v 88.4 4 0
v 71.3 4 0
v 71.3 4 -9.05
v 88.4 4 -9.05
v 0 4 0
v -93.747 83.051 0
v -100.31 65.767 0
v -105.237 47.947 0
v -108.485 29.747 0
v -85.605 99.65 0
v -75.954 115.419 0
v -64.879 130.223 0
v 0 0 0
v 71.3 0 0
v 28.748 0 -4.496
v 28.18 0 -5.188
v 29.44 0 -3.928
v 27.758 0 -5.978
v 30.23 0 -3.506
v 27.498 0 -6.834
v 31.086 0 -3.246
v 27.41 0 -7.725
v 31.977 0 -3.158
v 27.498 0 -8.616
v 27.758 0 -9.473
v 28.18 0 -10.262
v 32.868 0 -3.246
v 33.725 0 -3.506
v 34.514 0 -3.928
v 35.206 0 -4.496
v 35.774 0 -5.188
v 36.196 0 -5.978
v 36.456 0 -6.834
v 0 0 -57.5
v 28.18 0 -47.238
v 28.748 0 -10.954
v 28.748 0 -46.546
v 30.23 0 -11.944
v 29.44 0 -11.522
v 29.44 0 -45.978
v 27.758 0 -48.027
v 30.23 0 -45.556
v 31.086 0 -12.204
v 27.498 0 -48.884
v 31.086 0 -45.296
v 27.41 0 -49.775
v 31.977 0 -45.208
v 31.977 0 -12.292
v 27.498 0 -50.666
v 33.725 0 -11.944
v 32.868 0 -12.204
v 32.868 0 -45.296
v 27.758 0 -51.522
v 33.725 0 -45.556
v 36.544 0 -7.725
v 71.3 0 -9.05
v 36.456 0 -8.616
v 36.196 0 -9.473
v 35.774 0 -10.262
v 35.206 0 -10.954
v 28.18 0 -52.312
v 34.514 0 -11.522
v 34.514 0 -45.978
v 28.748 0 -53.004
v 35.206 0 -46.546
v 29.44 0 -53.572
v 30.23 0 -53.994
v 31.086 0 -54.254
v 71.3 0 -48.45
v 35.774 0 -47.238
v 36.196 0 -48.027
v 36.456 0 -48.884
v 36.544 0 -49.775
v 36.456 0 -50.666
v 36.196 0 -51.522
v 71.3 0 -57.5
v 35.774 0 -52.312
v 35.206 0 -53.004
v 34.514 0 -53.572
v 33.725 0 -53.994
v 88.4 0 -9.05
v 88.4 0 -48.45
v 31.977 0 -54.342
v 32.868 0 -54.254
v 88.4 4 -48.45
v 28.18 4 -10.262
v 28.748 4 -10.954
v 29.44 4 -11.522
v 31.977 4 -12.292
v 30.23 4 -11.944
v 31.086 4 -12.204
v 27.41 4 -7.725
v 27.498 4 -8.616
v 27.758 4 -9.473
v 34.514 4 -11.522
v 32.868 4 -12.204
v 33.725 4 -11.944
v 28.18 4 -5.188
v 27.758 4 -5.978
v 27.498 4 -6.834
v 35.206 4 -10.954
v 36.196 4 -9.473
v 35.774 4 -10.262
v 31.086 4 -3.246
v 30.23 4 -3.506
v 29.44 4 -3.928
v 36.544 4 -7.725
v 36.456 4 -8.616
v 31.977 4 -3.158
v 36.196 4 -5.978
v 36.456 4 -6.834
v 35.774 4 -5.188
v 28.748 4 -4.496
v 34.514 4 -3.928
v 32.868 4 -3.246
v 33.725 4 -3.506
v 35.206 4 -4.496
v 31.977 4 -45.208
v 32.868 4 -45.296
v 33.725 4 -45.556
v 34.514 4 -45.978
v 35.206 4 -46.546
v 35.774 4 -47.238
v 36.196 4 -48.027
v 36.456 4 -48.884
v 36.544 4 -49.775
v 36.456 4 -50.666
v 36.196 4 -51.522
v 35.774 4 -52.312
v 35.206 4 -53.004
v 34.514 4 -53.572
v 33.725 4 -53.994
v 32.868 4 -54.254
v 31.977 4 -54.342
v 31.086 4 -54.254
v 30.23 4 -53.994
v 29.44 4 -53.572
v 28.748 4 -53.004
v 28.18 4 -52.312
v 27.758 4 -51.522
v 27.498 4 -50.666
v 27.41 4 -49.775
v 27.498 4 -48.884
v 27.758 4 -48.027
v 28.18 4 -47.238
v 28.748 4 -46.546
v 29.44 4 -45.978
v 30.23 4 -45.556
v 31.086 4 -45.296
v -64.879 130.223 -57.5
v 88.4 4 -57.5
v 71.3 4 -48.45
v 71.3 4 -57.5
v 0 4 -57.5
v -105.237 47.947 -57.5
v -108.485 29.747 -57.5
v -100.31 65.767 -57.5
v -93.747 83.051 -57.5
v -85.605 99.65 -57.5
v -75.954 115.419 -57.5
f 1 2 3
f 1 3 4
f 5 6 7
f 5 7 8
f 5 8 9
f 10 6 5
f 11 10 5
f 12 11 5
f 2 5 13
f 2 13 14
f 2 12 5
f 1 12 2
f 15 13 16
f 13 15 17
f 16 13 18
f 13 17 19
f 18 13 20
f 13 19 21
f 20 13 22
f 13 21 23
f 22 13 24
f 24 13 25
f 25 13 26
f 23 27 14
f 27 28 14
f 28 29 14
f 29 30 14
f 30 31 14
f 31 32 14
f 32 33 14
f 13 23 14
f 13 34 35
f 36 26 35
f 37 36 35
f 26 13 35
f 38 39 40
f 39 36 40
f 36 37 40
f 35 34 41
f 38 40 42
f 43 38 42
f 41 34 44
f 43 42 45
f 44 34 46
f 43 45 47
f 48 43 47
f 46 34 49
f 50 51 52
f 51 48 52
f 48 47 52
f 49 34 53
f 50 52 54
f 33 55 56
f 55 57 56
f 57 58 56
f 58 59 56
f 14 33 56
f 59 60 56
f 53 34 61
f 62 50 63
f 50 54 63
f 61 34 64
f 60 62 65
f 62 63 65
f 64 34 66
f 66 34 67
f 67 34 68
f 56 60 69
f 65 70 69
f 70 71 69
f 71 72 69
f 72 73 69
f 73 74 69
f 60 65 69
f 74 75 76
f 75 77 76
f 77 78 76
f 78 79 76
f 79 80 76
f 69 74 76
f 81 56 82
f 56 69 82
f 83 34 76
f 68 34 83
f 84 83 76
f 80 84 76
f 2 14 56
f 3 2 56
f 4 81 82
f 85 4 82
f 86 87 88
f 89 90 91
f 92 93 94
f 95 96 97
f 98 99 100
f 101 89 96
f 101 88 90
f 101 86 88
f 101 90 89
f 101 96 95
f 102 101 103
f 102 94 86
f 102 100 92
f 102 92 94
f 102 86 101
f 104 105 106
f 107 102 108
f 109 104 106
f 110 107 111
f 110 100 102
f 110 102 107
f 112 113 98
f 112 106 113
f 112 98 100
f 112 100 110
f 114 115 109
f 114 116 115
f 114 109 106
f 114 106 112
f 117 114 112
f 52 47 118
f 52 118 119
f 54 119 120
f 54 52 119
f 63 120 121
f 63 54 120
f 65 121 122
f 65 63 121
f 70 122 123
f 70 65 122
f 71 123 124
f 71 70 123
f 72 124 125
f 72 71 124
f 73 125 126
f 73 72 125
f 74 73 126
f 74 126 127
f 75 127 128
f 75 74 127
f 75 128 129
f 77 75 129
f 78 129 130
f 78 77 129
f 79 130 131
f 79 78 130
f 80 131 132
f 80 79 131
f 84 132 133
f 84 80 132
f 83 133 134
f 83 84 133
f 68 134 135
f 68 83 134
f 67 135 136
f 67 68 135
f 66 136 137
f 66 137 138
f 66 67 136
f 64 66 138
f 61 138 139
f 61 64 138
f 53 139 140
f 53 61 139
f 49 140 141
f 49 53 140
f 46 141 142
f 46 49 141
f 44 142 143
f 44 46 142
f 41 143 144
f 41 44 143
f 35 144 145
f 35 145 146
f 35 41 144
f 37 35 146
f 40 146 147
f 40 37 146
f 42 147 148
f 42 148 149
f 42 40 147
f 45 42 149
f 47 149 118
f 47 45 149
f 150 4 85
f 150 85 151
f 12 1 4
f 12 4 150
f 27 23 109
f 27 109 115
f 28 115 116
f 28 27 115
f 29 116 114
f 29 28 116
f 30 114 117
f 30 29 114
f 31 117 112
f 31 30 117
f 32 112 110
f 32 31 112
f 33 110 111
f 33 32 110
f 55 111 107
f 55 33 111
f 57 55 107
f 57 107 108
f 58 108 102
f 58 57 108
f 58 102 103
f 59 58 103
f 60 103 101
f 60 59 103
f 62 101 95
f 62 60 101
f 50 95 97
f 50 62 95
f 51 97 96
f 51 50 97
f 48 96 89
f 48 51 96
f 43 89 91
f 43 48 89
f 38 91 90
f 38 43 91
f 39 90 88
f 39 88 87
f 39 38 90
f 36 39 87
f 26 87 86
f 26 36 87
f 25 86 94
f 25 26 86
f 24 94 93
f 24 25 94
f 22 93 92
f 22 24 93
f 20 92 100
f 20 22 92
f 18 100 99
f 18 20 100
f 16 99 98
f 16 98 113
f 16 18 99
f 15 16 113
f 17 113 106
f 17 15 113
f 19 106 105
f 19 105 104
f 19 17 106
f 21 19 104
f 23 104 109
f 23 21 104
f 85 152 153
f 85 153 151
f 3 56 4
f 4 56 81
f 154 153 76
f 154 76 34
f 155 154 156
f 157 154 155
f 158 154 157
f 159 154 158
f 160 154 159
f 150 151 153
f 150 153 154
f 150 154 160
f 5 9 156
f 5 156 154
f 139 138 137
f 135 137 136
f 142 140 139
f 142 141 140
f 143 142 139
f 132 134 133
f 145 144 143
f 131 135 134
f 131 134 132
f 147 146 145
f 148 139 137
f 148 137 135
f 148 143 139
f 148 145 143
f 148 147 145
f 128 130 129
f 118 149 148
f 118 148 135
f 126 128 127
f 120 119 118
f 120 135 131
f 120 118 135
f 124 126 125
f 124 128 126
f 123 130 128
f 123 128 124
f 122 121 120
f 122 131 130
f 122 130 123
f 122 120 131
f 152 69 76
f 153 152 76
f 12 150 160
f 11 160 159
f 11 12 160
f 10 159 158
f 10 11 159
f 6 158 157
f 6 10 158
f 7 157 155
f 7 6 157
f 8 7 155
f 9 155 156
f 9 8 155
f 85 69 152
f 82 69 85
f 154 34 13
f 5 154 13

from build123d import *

# Parameters (mm, degrees)
SKETCH1_R           = 4.566693037
SKETCH1_W           = 17.1
SKETCH1_H           = 39.4
BOSS_EXTRUDE1_DEPTH = 4
BOSS_EXTRUDE2_REACH = 107.531


with BuildPart() as part:
    # Sketch1 → Boss-Extrude1 (new body)
    # profile 1 of 2: a face of its own
    with BuildSketch(Plane(origin=(0, 0, 0), x_dir=(1, 0, 0), z_dir=(0, 1, 0))):
        Polygon((0, 57.5), (0, 0), (71.3, 0), (71.3, 9.05), (71.3, 48.45), (71.3, 57.5), align=None)
        with Locations(Location((31.977132175, 7.725129874, 0), (0, 0, 270))):
            Circle(SKETCH1_R, mode=Mode.SUBTRACT)
        with Locations(Location((31.977132175, 49.774870126, 0), (0, 0, 270))):
            Circle(SKETCH1_R, mode=Mode.SUBTRACT)
    # profile 2 of 2: a face of its own
    with BuildSketch(Plane(origin=(0, 0, 0), x_dir=(1, 0, 0), z_dir=(0, 1, 0))):
        with Locations((79.85, 28.75)):
            Rectangle(SKETCH1_W, SKETCH1_H)
    extrude(amount=BOSS_EXTRUDE1_DEPTH)

    # Boss-Extrude2: up to this face of the body (flat: up to its plane)
    boss_extrude2_end = Plane(part.part.faces().sort_by_distance((35.65, 2, -57.5))[0])
    # Sketch2 → Boss-Extrude2 (add, up to the picked face)
    with BuildSketch(Plane.XY, mode=Mode.PRIVATE) as boss_extrude2_sk1:
        with BuildLine():
            Line((0, 4), (88.4, 4))
            Line((88.4, 4), (-64.878686432, 130.222546803))
            ThreePointArc((-64.878686432, 130.222546803), (-93.746808792, 83.050787997), (-108.484737296, 29.746596971))
            Line((-108.484737296, 29.746596971), (0, 4))
        make_face()
    boss_extrude2_tool1 = split(extrude(boss_extrude2_sk1.sketch, amount=-BOSS_EXTRUDE2_REACH, mode=Mode.PRIVATE), bisect_by=boss_extrude2_end, keep=Keep.BOTH, mode=Mode.PRIVATE)
    add(boss_extrude2_tool1.solids().sort_by(Axis((-29.138762, 51.950808, 0), (0, 0, -1)))[0])


solid = part.part
